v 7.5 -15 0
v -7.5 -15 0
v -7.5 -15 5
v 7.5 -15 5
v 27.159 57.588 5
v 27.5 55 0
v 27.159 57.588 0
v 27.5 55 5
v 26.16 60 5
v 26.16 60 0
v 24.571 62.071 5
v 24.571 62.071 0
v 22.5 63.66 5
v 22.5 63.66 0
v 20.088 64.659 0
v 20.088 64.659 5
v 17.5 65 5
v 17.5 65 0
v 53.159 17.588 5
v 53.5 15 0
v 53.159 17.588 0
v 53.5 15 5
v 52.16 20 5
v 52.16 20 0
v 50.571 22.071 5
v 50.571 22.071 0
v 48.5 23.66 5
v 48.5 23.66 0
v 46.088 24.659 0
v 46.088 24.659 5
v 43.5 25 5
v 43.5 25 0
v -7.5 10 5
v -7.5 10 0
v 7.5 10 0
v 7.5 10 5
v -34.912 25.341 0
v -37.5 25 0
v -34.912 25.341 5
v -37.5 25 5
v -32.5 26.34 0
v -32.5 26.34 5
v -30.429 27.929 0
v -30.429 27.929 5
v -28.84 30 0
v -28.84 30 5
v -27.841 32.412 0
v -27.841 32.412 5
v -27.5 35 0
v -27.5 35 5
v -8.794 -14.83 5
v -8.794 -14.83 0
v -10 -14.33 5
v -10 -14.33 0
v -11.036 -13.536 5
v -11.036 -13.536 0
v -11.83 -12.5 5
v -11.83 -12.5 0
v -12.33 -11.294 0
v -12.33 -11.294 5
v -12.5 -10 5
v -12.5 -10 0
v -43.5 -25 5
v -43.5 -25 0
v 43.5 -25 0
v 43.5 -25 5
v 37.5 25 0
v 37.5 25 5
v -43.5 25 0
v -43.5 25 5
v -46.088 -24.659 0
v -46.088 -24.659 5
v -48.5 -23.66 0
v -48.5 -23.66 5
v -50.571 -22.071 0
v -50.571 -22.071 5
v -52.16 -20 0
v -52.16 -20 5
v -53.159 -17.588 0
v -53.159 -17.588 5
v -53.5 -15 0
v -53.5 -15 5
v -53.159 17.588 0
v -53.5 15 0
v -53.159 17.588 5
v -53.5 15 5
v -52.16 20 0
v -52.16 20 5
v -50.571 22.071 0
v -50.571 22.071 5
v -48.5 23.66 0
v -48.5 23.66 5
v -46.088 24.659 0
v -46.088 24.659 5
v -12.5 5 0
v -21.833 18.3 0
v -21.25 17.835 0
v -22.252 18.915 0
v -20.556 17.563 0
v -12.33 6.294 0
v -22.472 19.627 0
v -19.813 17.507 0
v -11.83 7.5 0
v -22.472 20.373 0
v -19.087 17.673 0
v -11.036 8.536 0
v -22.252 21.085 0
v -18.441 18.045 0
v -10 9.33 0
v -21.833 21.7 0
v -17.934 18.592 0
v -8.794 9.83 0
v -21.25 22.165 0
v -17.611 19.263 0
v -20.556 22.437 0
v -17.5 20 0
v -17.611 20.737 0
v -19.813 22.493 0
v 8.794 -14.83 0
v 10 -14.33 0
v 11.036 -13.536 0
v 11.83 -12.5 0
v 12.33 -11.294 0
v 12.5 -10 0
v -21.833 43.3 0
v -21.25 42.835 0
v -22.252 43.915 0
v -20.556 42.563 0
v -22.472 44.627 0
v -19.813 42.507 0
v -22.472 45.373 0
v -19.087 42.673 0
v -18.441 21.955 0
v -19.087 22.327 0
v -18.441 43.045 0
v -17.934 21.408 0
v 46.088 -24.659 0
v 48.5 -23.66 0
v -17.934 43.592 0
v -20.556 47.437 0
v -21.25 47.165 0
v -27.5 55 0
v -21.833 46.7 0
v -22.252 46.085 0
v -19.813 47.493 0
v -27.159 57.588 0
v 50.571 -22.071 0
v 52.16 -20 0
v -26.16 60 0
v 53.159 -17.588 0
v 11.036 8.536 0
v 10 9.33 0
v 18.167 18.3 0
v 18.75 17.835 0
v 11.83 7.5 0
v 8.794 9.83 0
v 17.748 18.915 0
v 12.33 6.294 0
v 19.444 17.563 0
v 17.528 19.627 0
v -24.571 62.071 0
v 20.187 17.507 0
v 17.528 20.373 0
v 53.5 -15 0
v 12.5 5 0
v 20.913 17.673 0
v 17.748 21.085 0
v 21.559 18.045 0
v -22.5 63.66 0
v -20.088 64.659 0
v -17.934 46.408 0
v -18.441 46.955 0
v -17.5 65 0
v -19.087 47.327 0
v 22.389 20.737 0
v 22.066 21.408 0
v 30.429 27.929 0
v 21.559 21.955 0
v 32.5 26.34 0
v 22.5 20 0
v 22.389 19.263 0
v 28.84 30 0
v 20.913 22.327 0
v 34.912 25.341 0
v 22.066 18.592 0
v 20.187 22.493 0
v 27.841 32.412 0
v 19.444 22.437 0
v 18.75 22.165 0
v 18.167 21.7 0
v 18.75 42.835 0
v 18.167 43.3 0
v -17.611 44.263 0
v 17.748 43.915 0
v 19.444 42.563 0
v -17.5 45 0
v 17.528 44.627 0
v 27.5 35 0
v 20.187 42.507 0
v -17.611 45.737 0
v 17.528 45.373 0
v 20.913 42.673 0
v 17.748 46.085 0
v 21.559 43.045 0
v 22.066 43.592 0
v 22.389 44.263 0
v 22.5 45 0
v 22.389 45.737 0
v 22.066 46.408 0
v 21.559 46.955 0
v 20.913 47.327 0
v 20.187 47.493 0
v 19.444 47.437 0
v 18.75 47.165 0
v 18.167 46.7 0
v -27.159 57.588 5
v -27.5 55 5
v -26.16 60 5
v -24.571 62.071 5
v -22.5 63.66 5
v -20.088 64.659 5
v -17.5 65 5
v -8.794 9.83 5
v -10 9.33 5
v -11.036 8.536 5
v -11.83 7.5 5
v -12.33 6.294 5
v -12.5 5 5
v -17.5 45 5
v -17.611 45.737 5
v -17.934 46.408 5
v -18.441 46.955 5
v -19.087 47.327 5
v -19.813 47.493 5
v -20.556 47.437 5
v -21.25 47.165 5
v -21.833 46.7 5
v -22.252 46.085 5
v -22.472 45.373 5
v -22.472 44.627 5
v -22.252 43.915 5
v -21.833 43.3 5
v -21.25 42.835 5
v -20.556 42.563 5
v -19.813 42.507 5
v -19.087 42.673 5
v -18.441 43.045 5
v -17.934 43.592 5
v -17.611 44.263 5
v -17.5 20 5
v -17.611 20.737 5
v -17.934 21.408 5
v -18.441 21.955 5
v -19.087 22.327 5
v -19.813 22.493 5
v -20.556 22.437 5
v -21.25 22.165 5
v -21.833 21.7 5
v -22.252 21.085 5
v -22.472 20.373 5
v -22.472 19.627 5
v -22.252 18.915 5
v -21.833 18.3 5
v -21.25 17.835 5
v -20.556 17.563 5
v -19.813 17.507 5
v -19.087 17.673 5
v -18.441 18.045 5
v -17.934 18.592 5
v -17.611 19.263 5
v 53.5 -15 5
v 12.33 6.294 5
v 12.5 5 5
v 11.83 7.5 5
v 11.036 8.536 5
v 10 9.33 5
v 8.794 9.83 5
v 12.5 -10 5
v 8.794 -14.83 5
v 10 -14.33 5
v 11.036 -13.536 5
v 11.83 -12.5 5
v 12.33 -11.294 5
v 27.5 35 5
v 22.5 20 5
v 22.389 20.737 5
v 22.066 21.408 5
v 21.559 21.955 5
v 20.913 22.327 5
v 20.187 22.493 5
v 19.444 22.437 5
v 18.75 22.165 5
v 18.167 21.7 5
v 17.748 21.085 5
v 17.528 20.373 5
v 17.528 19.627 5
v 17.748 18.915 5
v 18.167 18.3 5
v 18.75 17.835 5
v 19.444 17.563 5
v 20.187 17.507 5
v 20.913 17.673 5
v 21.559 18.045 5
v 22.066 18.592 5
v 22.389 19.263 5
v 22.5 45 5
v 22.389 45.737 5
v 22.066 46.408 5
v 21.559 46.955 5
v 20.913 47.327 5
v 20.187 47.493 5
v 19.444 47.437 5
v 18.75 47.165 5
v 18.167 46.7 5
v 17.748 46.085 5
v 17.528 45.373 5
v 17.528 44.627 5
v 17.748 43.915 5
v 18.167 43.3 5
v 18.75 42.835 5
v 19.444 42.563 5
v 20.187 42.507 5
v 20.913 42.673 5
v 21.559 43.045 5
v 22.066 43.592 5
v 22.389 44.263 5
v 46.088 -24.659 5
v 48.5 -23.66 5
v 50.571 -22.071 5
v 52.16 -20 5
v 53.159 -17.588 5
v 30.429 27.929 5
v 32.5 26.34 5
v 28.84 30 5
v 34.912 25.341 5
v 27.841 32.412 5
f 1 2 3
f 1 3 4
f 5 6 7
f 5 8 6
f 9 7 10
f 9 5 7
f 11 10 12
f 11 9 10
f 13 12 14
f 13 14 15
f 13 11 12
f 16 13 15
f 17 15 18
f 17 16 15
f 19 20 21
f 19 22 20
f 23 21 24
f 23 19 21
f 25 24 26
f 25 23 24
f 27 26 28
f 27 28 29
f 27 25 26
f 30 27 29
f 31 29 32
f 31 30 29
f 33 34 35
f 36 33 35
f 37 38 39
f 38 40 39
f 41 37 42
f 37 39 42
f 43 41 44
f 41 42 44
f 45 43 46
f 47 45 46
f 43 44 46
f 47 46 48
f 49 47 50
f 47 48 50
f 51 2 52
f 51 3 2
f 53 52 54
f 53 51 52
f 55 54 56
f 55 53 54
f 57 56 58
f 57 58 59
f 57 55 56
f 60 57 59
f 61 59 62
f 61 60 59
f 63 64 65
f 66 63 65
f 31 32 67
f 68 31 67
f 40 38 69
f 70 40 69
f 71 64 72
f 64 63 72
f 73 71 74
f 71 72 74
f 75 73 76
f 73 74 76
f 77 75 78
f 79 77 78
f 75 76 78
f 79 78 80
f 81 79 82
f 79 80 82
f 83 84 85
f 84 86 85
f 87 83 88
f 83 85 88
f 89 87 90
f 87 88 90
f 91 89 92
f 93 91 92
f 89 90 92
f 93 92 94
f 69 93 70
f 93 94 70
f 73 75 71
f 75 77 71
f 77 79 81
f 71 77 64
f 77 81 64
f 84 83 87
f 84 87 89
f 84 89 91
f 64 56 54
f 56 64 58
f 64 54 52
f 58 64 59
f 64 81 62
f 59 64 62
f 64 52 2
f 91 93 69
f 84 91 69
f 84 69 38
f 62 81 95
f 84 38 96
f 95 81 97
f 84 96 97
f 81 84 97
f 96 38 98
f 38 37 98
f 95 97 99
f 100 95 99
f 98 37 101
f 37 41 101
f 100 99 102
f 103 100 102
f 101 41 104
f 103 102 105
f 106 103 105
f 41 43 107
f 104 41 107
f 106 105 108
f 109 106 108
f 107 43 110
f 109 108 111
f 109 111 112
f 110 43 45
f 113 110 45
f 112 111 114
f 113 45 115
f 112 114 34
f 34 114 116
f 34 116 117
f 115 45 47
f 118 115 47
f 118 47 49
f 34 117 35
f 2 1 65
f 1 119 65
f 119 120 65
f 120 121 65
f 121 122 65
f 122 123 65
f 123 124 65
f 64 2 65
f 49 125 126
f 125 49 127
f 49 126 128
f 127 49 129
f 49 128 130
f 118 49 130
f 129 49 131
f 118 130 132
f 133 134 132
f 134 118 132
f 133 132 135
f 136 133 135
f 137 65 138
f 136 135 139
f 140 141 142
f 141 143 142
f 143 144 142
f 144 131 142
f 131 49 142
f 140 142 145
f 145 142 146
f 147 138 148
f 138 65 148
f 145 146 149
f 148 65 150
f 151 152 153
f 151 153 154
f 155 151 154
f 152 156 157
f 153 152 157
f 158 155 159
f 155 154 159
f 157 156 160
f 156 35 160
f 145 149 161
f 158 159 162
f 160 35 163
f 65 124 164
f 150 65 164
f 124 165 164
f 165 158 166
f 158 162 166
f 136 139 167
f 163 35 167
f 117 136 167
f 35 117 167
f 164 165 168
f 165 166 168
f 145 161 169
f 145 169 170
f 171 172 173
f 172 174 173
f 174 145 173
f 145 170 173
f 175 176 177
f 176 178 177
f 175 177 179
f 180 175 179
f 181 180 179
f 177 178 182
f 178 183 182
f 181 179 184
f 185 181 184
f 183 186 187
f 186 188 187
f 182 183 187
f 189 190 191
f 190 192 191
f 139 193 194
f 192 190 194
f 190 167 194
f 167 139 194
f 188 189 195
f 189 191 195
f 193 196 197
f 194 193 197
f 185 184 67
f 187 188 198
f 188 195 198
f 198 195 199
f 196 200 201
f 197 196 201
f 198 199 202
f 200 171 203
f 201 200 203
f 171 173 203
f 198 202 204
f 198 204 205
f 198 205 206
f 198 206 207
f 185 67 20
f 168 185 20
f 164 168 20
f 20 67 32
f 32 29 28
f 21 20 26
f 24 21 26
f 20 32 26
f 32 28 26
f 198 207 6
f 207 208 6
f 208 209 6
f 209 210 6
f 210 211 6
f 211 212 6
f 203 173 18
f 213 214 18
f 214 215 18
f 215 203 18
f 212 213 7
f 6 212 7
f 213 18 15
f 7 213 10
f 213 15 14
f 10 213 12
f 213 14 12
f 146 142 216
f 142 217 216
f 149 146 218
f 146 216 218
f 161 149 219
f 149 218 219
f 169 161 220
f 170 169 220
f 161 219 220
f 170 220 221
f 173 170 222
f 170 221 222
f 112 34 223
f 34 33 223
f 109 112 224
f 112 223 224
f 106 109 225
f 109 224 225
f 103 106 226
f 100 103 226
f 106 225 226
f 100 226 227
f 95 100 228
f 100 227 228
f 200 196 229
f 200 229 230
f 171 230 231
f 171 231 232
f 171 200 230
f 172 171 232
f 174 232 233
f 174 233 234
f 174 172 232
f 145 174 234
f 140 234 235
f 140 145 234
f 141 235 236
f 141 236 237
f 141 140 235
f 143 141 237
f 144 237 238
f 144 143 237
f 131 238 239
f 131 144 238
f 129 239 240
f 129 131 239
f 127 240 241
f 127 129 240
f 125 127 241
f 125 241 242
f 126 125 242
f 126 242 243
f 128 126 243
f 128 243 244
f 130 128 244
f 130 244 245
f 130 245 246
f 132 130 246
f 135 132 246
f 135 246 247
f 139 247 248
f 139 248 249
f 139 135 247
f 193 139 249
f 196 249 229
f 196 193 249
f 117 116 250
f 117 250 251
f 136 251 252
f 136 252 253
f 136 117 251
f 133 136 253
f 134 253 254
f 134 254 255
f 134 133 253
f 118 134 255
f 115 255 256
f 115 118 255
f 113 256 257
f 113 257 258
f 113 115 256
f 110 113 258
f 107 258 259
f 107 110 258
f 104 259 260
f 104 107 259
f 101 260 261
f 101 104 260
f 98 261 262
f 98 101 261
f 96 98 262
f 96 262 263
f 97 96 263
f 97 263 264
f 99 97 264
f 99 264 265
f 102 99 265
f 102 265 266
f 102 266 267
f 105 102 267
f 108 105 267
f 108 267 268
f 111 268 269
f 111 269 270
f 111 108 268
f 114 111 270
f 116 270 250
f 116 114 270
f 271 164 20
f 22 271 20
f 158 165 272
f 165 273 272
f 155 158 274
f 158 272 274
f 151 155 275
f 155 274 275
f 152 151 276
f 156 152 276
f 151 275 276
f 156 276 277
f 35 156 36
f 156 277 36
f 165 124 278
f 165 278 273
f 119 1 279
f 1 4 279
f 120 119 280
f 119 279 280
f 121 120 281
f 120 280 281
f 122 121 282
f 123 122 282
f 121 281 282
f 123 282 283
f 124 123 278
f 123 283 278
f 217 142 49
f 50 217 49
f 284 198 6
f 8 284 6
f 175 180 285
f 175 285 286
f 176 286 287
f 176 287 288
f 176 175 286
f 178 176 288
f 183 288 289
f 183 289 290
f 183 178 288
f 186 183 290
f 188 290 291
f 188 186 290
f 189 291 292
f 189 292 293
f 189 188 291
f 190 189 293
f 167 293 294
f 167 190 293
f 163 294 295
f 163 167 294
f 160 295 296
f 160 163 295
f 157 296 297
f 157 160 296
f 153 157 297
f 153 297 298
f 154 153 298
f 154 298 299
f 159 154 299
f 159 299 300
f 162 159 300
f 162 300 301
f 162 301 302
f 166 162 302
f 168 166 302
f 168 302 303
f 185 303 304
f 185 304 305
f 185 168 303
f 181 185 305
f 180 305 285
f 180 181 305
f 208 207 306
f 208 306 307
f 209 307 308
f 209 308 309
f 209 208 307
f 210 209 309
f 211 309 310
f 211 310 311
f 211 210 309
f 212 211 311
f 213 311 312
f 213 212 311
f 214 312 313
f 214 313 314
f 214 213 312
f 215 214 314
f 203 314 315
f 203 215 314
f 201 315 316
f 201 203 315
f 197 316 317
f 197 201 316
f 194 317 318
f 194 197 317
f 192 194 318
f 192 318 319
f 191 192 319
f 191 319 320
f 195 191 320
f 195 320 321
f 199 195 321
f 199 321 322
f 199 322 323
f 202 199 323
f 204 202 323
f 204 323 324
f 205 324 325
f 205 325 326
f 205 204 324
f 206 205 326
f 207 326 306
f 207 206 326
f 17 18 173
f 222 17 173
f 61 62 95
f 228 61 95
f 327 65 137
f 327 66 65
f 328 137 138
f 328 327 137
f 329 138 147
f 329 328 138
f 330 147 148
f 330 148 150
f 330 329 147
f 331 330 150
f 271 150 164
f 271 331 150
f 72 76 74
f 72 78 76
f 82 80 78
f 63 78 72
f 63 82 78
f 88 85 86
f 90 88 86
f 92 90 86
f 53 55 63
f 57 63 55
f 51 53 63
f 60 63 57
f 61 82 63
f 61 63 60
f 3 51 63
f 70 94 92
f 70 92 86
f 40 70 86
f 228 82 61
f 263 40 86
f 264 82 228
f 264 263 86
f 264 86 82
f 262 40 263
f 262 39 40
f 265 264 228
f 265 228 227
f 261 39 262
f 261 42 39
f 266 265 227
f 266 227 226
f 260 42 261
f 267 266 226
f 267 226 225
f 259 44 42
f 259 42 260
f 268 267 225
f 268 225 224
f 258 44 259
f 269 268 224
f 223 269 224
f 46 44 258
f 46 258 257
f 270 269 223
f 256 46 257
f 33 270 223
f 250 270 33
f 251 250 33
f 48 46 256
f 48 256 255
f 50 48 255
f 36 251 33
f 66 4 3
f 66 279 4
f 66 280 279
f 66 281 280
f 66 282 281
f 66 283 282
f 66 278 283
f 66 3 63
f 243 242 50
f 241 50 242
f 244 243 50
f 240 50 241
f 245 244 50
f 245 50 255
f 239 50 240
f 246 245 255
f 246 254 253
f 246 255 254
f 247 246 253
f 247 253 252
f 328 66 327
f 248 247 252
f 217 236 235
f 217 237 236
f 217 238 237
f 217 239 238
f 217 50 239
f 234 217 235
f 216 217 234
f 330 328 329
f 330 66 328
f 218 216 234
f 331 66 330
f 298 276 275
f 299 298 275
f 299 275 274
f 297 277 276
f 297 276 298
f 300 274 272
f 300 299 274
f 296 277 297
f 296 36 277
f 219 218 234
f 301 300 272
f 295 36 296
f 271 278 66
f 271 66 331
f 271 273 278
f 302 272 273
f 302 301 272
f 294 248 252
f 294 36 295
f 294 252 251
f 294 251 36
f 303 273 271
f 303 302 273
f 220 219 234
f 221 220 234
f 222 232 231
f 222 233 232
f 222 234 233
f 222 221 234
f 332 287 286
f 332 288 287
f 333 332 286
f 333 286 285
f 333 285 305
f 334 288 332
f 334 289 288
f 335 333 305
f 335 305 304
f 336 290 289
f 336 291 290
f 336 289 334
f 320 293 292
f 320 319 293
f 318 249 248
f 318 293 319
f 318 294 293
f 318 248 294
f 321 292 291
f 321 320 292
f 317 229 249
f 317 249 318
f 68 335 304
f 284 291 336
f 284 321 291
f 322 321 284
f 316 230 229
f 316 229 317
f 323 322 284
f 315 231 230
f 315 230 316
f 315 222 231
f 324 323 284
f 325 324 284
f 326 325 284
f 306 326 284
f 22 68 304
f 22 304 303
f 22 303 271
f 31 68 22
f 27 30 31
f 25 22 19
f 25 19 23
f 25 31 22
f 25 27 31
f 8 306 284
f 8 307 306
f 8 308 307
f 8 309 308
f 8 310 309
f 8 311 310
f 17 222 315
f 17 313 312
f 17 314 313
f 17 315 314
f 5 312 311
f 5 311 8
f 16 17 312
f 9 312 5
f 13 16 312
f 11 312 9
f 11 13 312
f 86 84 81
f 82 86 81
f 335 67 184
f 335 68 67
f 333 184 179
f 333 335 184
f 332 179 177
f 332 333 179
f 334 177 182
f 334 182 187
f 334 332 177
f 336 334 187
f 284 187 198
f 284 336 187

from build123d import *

# Parameters (mm, degrees)
SKETCH1_4_W         = 25
SKETCH1_4_H         = 25
SKETCH1_4_R         = 2.5
BOSS_EXTRUDE2_DEPTH = 5
FILLET3_R           = 10
FILLET4_R           = 5


with BuildPart() as part:
    # Sketch1<4> → Boss-Extrude2 (new body)
    with BuildSketch(Plane.XY):
        Polygon((-53.5, 25), (-53.5, -25), (53.5, -25), (53.5, 25), (27.5, 25), (27.5, 65), (-27.5, 65), (-27.5, 25), align=None)
        with Locations((0, -2.5)):
            Rectangle(SKETCH1_4_W, SKETCH1_4_H, mode=Mode.SUBTRACT)
        with Locations((-20, 20)):
            Circle(SKETCH1_4_R, mode=Mode.SUBTRACT)
        with Locations((-20, 45)):
            Circle(SKETCH1_4_R, mode=Mode.SUBTRACT)
        with Locations((20, 20)):
            Circle(SKETCH1_4_R, mode=Mode.SUBTRACT)
        with Locations((20, 45)):
            Circle(SKETCH1_4_R, mode=Mode.SUBTRACT)
    extrude(amount=BOSS_EXTRUDE2_DEPTH)

    # Fillet3
    fillet3_edges = [part.edges().sort_by_distance(p)[0] for p in [
        (-27.5, 65, 2.5),
        (27.5, 65, 2.5),
        (27.5, 25, 2.5),
        (53.5, 25, 2.5),
        (53.5, -25, 2.5),
        (-53.5, 25, 2.5),
        (-27.5, 25, 2.5),
        (-53.5, -25, 2.5),
    ]]
    fillet(fillet3_edges, radius=FILLET3_R)

    # Fillet4
    fillet4_edges = [part.edges().sort_by_distance(p)[0] for p in [
        (-12.5, 10, 2.5),
        (-12.5, -15, 2.5),
        (12.5, -15, 2.5),
        (12.5, 10, 2.5),
    ]]
    fillet(fillet4_edges, radius=FILLET4_R)


solid = part.part
